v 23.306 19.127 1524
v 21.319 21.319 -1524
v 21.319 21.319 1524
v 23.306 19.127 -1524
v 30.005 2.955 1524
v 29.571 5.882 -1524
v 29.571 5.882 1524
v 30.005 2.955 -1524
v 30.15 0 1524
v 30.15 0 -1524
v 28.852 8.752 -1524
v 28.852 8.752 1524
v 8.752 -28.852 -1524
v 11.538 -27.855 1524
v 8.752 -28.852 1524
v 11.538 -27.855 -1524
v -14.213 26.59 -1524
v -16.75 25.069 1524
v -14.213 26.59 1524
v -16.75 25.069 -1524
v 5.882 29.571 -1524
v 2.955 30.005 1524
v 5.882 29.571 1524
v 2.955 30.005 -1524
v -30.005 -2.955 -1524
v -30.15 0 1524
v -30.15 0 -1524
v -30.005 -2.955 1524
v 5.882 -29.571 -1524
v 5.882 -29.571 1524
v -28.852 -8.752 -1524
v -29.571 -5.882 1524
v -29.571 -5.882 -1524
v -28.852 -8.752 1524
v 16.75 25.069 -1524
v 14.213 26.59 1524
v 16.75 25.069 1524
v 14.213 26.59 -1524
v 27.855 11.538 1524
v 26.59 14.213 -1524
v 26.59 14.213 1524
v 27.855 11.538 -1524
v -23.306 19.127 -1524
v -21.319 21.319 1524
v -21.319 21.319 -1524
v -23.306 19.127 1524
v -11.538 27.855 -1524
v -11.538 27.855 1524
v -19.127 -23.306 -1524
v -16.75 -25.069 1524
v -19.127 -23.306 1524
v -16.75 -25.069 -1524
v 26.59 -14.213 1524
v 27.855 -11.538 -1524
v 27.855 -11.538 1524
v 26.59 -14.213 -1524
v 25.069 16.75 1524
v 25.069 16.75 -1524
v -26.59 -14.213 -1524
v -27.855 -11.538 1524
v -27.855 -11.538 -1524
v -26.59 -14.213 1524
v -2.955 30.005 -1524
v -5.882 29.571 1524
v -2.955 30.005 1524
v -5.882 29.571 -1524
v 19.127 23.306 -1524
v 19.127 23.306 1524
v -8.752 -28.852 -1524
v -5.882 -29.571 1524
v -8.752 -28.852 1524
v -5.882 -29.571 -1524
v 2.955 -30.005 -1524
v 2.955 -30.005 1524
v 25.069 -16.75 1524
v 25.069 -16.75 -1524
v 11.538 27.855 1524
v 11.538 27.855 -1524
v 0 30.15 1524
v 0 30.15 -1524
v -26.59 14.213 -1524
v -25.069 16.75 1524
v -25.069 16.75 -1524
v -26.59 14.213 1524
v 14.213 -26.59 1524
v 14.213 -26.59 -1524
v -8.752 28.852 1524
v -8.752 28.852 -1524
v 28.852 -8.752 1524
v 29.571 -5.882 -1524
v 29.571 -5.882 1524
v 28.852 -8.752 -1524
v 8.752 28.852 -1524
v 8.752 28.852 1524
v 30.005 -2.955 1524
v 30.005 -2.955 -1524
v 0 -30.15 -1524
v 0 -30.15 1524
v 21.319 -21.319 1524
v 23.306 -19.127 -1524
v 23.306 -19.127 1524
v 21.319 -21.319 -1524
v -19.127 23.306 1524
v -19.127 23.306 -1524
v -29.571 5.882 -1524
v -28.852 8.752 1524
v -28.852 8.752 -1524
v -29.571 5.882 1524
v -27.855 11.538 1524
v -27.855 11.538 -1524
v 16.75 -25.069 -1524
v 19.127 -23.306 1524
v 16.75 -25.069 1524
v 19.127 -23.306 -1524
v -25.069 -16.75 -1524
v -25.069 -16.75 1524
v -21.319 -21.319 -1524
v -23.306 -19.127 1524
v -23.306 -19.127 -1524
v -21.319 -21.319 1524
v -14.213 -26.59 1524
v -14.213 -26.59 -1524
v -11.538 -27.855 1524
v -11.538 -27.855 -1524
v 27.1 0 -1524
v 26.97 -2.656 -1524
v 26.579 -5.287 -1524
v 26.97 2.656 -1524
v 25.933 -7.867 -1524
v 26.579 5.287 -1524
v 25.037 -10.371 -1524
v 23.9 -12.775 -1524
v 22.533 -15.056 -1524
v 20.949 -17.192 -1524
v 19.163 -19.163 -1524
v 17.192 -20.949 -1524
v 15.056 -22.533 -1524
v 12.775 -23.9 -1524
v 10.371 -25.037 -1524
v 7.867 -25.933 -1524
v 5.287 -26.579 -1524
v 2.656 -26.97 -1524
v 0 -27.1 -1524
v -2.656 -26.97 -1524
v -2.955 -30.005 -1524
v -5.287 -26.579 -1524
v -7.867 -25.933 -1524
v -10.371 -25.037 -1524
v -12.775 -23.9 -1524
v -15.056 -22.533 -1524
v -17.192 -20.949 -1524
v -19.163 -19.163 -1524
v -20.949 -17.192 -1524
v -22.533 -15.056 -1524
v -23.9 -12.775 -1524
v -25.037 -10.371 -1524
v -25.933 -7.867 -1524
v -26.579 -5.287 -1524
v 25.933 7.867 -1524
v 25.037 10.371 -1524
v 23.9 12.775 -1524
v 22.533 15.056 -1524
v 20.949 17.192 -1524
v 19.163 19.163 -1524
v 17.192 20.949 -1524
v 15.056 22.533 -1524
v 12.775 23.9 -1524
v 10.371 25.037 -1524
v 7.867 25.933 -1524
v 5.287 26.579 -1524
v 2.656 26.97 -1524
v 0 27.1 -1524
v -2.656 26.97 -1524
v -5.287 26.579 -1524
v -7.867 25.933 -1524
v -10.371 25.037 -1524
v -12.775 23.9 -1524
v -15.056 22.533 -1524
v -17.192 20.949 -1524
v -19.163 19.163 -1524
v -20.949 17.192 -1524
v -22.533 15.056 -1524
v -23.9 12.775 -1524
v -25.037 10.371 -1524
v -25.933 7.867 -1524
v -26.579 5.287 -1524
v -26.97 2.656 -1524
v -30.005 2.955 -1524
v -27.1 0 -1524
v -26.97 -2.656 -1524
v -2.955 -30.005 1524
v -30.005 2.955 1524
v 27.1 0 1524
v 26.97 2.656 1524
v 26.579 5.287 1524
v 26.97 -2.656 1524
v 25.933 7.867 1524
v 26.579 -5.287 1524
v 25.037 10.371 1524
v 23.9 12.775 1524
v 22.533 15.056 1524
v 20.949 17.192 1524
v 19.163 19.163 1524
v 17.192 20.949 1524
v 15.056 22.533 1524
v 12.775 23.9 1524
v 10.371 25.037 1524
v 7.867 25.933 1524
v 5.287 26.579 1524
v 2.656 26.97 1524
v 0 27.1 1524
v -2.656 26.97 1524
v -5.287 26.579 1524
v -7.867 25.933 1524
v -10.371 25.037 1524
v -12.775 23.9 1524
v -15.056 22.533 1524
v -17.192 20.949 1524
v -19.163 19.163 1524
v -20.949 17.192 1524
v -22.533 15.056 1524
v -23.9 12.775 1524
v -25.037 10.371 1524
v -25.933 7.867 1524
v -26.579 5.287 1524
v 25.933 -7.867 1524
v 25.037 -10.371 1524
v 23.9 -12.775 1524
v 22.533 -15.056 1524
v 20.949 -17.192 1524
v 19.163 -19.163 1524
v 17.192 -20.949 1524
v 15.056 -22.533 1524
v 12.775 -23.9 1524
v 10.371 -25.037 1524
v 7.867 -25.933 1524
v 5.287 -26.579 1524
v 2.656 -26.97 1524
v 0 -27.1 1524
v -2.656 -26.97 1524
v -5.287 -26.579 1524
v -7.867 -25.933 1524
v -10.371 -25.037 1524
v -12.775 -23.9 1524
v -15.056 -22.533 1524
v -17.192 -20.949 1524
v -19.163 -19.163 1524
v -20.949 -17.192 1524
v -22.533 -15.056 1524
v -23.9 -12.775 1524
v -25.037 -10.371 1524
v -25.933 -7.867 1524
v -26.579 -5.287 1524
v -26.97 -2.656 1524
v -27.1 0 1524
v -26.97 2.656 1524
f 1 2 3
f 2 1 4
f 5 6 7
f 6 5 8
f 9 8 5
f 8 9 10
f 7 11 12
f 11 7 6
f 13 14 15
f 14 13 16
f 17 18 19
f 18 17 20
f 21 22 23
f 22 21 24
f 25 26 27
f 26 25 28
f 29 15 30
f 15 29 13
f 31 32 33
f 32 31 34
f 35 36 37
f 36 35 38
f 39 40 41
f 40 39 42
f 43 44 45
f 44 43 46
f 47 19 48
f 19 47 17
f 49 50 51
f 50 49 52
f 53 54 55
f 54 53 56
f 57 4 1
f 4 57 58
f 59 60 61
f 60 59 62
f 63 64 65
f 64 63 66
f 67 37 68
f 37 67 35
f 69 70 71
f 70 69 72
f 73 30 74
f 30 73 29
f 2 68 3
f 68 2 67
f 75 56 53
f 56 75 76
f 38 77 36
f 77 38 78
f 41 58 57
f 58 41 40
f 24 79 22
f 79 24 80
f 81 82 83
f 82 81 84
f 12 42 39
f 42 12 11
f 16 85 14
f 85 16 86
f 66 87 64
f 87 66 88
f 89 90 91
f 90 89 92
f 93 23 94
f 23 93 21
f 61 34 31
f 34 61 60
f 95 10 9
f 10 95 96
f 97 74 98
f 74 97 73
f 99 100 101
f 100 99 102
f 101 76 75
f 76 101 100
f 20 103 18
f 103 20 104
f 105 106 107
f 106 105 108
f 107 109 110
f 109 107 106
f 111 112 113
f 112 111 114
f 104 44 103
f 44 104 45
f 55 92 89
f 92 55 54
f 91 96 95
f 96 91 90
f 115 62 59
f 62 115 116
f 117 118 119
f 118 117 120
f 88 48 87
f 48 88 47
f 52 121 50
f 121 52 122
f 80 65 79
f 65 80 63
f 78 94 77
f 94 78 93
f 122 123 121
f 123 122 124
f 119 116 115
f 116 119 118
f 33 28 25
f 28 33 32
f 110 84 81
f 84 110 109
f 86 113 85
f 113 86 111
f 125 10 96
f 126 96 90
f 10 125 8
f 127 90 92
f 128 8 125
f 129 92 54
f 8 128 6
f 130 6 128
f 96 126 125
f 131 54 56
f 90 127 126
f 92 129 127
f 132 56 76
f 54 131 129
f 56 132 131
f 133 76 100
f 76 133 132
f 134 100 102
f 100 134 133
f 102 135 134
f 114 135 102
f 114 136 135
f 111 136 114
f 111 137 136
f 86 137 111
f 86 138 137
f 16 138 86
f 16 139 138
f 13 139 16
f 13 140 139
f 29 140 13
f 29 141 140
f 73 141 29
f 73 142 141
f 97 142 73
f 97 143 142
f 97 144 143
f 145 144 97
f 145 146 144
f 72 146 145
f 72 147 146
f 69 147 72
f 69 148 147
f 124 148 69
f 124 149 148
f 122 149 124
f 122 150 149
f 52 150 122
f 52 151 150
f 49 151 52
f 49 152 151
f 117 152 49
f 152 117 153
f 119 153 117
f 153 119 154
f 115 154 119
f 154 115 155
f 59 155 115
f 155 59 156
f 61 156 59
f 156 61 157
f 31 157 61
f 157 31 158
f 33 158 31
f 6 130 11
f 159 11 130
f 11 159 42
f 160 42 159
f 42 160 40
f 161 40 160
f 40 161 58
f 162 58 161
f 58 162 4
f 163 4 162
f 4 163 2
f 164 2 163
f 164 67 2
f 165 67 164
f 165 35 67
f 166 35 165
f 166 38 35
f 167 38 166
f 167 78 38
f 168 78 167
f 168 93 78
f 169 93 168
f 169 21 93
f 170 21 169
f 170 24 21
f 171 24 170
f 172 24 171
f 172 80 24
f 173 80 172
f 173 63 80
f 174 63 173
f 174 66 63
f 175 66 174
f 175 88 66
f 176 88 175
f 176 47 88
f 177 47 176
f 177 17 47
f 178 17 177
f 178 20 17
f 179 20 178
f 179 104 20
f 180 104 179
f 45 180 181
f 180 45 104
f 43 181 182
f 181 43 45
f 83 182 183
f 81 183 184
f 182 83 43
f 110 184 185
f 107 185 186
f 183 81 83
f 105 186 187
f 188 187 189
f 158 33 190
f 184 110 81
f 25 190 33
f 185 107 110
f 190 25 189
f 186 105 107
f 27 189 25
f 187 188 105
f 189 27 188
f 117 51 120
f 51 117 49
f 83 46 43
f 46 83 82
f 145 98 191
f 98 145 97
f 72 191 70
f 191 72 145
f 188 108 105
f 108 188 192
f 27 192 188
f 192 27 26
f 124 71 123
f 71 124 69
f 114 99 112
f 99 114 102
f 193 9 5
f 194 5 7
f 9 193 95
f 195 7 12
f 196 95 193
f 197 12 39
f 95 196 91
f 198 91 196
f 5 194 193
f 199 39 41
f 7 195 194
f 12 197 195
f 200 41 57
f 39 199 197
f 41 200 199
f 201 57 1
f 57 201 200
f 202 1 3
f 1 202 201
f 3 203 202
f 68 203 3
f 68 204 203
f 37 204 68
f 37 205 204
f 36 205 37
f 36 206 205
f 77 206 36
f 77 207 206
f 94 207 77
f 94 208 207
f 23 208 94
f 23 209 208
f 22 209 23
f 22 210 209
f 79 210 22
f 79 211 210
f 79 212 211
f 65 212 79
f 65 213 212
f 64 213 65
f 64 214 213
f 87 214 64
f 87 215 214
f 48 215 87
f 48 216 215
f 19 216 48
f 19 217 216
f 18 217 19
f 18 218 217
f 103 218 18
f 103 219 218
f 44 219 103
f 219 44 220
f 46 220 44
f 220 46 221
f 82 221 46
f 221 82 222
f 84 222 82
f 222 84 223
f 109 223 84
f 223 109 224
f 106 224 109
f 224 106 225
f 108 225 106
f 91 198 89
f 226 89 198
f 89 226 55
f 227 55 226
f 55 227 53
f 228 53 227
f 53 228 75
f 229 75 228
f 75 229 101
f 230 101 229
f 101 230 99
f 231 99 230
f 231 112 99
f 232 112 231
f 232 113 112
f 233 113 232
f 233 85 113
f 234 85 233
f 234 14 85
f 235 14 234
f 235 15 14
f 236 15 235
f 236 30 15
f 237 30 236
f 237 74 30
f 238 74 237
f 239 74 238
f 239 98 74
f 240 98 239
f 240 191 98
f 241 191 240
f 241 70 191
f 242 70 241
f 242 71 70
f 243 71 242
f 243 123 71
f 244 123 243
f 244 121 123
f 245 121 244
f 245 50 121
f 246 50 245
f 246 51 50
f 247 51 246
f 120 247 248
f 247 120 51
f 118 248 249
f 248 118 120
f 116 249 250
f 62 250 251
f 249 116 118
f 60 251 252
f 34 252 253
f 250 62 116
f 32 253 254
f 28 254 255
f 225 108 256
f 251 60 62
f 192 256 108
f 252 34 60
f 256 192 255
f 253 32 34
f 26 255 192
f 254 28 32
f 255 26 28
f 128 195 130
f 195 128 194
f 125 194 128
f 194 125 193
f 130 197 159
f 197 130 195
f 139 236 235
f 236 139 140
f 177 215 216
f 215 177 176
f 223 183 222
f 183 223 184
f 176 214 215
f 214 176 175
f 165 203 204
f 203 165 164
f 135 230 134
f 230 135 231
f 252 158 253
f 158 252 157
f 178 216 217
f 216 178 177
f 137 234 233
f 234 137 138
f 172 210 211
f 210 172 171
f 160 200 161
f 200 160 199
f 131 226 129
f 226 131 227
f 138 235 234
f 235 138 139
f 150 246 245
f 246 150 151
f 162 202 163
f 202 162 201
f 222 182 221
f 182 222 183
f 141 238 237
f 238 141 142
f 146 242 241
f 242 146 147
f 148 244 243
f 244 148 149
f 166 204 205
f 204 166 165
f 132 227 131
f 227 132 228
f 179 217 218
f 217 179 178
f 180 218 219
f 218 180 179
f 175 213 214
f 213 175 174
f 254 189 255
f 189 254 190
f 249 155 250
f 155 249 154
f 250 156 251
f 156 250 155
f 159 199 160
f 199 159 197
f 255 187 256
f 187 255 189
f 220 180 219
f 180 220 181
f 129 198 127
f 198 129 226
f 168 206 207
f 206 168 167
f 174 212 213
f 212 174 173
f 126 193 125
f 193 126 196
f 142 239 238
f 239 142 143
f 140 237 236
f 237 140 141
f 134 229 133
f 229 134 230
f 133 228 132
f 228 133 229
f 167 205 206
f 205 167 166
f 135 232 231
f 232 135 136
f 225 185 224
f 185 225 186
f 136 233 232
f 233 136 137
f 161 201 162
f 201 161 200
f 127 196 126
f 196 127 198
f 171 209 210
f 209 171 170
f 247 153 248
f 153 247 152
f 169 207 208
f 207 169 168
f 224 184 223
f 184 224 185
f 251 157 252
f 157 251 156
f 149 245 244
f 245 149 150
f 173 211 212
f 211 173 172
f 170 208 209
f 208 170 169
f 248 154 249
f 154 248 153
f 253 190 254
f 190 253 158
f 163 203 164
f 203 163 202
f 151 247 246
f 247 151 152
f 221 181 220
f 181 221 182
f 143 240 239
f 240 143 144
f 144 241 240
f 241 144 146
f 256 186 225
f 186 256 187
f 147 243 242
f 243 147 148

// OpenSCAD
// Auto-generated by scripts/author_from_manifest.py (Phase D.3).
// Source: data/phase_d_manifest.json (sku_intent='blazemaster-cpvc-2in-10ft').
// Do not hand-edit — regenerate from the manifest.
//
// @part blazemaster_cpvc_2in_10ft
// @kind pipe_segment
// @category pipe.cpvc.blazemaster
// @display-name "Cpvc Blazemaster 2\" x 10ft"
// @mfg lubrizol_blazemaster
// @listing UL
// @price-usd 13.00
// @install-minutes 6
// @crew journeyman
// @param size_in number default=2 label="Size" unit="in"
// @port inlet position=[0,0,-0.5] direction=[0,0,-1] style=grooved size_in=2 role=run_a
// @port outlet position=[0,0,0.5] direction=[0,0,1] style=grooved size_in=2 role=run_b

size_in  = 2.0;
length_m = 3.0480;
schedule = "sch10";

function od_mm(nps) =
    nps ==  0.75 ? 26.7 :
    nps ==   1  ? 33.4 :
    nps == 1.25 ? 42.2 :
    nps == 1.5  ? 48.3 :
    nps ==   2  ? 60.3 :
    nps == 2.5  ? 73.0 :
    nps ==   3  ? 88.9 :
    nps ==   4  ? 114.3 :
    nps ==   5  ? 141.3 :
    nps ==   6  ? 168.3 :
    nps ==   8  ? 219.1 :
    nps ==  10  ? 273.0 : 60.3;

function wall_mm(nps, sched) =
    sched == "sch40"
        ? (nps <= 1.5 ? 3.68 : nps <= 3 ? 5.49 : 6.02)
        : (nps <= 1.5 ? 2.77 : nps <= 3 ? 3.05 : 3.68);

od = od_mm(size_in);
id = od - 2 * wall_mm(size_in, schedule);
len_mm = length_m * 1000;

difference() {
    cylinder(h = len_mm, d = od, center = true, $fn = 64);
    cylinder(h = len_mm + 1, d = id, center = true, $fn = 64);
}
